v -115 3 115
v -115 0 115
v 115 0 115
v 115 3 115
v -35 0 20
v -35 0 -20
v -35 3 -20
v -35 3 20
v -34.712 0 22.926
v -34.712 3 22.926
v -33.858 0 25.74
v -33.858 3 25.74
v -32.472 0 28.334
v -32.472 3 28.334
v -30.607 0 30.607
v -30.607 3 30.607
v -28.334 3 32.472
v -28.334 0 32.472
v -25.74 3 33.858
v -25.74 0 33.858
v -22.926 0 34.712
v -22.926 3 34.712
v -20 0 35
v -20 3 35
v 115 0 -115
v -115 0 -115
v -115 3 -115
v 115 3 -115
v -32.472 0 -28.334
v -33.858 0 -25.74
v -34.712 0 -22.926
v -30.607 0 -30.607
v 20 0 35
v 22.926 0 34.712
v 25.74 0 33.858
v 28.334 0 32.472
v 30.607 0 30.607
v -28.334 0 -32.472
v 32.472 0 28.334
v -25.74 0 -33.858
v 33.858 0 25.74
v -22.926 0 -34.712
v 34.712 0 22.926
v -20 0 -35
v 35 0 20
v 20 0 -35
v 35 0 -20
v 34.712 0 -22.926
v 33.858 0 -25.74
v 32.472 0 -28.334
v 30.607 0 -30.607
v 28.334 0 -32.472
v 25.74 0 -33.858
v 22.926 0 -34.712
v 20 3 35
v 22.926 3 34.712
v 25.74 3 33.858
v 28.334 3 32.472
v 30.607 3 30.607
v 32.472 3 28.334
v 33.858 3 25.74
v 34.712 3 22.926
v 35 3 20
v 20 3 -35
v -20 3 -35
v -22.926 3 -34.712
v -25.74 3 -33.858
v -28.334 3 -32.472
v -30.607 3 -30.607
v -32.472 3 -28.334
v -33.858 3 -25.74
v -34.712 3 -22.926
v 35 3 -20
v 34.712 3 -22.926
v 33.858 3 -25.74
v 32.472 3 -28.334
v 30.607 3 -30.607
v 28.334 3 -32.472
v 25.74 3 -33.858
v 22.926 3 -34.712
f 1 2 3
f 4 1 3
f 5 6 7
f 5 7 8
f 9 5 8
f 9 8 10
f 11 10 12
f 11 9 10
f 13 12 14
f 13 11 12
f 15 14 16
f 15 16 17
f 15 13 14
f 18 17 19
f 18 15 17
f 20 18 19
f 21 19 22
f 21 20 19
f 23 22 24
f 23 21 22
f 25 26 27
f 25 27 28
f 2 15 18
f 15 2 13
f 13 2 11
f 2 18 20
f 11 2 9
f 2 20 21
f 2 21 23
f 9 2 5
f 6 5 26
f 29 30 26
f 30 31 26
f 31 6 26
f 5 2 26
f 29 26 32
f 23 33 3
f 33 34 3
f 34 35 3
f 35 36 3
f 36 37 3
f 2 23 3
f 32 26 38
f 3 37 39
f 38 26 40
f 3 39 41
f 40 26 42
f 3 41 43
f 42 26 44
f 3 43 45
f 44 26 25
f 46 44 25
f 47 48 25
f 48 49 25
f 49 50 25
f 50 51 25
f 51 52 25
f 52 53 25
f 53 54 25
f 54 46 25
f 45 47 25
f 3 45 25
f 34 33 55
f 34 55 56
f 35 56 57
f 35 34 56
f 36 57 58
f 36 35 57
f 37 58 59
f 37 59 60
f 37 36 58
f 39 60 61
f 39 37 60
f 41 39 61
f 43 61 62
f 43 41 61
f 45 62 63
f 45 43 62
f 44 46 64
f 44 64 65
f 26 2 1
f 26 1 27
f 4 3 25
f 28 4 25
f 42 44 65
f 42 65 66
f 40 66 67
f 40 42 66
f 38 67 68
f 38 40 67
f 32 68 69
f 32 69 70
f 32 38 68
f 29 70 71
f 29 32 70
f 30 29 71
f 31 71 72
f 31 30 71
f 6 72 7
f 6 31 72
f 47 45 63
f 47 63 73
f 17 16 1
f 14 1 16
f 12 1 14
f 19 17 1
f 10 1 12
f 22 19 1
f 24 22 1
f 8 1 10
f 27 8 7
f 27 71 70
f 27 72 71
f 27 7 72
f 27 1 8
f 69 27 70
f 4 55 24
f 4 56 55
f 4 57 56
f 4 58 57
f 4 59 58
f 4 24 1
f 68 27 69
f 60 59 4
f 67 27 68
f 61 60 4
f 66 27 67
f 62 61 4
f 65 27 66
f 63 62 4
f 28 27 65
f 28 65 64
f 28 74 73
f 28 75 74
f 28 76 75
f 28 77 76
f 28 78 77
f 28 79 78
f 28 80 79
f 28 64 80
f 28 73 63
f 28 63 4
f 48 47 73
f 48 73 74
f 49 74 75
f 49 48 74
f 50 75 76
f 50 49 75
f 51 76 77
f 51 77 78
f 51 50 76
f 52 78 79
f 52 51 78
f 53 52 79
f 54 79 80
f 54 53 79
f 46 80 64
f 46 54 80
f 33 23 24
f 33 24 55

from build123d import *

# Parameters (mm, degrees)
SKETCH1_W           = 230
SKETCH1_H           = 230
BOSS_EXTRUDE1_DEPTH = 3


with BuildPart() as part:
    # Sketch1 → Boss-Extrude1 (new body)
    with BuildSketch(Plane(origin=(0, 0, 0), x_dir=(1, 0, 0), z_dir=(0, 1, 0))):
        Rectangle(SKETCH1_W, SKETCH1_H)
        with BuildLine():
            Line((-20, -35), (20, -35))
            ThreePointArc((20, -35), (30.606601718, -30.606601718), (35, -20))
            Line((35, -20), (35, 20))
            ThreePointArc((35, 20), (30.606601718, 30.606601718), (20, 35))
            Line((20, 35), (-20, 35))
            ThreePointArc((-20, 35), (-30.606601718, 30.606601718), (-35, 20))
            Line((-35, 20), (-35, -20))
            ThreePointArc((-35, -20), (-30.606601718, -30.606601718), (-20, -35))
        make_face(mode=Mode.SUBTRACT)
    extrude(amount=BOSS_EXTRUDE1_DEPTH)


solid = part.part
